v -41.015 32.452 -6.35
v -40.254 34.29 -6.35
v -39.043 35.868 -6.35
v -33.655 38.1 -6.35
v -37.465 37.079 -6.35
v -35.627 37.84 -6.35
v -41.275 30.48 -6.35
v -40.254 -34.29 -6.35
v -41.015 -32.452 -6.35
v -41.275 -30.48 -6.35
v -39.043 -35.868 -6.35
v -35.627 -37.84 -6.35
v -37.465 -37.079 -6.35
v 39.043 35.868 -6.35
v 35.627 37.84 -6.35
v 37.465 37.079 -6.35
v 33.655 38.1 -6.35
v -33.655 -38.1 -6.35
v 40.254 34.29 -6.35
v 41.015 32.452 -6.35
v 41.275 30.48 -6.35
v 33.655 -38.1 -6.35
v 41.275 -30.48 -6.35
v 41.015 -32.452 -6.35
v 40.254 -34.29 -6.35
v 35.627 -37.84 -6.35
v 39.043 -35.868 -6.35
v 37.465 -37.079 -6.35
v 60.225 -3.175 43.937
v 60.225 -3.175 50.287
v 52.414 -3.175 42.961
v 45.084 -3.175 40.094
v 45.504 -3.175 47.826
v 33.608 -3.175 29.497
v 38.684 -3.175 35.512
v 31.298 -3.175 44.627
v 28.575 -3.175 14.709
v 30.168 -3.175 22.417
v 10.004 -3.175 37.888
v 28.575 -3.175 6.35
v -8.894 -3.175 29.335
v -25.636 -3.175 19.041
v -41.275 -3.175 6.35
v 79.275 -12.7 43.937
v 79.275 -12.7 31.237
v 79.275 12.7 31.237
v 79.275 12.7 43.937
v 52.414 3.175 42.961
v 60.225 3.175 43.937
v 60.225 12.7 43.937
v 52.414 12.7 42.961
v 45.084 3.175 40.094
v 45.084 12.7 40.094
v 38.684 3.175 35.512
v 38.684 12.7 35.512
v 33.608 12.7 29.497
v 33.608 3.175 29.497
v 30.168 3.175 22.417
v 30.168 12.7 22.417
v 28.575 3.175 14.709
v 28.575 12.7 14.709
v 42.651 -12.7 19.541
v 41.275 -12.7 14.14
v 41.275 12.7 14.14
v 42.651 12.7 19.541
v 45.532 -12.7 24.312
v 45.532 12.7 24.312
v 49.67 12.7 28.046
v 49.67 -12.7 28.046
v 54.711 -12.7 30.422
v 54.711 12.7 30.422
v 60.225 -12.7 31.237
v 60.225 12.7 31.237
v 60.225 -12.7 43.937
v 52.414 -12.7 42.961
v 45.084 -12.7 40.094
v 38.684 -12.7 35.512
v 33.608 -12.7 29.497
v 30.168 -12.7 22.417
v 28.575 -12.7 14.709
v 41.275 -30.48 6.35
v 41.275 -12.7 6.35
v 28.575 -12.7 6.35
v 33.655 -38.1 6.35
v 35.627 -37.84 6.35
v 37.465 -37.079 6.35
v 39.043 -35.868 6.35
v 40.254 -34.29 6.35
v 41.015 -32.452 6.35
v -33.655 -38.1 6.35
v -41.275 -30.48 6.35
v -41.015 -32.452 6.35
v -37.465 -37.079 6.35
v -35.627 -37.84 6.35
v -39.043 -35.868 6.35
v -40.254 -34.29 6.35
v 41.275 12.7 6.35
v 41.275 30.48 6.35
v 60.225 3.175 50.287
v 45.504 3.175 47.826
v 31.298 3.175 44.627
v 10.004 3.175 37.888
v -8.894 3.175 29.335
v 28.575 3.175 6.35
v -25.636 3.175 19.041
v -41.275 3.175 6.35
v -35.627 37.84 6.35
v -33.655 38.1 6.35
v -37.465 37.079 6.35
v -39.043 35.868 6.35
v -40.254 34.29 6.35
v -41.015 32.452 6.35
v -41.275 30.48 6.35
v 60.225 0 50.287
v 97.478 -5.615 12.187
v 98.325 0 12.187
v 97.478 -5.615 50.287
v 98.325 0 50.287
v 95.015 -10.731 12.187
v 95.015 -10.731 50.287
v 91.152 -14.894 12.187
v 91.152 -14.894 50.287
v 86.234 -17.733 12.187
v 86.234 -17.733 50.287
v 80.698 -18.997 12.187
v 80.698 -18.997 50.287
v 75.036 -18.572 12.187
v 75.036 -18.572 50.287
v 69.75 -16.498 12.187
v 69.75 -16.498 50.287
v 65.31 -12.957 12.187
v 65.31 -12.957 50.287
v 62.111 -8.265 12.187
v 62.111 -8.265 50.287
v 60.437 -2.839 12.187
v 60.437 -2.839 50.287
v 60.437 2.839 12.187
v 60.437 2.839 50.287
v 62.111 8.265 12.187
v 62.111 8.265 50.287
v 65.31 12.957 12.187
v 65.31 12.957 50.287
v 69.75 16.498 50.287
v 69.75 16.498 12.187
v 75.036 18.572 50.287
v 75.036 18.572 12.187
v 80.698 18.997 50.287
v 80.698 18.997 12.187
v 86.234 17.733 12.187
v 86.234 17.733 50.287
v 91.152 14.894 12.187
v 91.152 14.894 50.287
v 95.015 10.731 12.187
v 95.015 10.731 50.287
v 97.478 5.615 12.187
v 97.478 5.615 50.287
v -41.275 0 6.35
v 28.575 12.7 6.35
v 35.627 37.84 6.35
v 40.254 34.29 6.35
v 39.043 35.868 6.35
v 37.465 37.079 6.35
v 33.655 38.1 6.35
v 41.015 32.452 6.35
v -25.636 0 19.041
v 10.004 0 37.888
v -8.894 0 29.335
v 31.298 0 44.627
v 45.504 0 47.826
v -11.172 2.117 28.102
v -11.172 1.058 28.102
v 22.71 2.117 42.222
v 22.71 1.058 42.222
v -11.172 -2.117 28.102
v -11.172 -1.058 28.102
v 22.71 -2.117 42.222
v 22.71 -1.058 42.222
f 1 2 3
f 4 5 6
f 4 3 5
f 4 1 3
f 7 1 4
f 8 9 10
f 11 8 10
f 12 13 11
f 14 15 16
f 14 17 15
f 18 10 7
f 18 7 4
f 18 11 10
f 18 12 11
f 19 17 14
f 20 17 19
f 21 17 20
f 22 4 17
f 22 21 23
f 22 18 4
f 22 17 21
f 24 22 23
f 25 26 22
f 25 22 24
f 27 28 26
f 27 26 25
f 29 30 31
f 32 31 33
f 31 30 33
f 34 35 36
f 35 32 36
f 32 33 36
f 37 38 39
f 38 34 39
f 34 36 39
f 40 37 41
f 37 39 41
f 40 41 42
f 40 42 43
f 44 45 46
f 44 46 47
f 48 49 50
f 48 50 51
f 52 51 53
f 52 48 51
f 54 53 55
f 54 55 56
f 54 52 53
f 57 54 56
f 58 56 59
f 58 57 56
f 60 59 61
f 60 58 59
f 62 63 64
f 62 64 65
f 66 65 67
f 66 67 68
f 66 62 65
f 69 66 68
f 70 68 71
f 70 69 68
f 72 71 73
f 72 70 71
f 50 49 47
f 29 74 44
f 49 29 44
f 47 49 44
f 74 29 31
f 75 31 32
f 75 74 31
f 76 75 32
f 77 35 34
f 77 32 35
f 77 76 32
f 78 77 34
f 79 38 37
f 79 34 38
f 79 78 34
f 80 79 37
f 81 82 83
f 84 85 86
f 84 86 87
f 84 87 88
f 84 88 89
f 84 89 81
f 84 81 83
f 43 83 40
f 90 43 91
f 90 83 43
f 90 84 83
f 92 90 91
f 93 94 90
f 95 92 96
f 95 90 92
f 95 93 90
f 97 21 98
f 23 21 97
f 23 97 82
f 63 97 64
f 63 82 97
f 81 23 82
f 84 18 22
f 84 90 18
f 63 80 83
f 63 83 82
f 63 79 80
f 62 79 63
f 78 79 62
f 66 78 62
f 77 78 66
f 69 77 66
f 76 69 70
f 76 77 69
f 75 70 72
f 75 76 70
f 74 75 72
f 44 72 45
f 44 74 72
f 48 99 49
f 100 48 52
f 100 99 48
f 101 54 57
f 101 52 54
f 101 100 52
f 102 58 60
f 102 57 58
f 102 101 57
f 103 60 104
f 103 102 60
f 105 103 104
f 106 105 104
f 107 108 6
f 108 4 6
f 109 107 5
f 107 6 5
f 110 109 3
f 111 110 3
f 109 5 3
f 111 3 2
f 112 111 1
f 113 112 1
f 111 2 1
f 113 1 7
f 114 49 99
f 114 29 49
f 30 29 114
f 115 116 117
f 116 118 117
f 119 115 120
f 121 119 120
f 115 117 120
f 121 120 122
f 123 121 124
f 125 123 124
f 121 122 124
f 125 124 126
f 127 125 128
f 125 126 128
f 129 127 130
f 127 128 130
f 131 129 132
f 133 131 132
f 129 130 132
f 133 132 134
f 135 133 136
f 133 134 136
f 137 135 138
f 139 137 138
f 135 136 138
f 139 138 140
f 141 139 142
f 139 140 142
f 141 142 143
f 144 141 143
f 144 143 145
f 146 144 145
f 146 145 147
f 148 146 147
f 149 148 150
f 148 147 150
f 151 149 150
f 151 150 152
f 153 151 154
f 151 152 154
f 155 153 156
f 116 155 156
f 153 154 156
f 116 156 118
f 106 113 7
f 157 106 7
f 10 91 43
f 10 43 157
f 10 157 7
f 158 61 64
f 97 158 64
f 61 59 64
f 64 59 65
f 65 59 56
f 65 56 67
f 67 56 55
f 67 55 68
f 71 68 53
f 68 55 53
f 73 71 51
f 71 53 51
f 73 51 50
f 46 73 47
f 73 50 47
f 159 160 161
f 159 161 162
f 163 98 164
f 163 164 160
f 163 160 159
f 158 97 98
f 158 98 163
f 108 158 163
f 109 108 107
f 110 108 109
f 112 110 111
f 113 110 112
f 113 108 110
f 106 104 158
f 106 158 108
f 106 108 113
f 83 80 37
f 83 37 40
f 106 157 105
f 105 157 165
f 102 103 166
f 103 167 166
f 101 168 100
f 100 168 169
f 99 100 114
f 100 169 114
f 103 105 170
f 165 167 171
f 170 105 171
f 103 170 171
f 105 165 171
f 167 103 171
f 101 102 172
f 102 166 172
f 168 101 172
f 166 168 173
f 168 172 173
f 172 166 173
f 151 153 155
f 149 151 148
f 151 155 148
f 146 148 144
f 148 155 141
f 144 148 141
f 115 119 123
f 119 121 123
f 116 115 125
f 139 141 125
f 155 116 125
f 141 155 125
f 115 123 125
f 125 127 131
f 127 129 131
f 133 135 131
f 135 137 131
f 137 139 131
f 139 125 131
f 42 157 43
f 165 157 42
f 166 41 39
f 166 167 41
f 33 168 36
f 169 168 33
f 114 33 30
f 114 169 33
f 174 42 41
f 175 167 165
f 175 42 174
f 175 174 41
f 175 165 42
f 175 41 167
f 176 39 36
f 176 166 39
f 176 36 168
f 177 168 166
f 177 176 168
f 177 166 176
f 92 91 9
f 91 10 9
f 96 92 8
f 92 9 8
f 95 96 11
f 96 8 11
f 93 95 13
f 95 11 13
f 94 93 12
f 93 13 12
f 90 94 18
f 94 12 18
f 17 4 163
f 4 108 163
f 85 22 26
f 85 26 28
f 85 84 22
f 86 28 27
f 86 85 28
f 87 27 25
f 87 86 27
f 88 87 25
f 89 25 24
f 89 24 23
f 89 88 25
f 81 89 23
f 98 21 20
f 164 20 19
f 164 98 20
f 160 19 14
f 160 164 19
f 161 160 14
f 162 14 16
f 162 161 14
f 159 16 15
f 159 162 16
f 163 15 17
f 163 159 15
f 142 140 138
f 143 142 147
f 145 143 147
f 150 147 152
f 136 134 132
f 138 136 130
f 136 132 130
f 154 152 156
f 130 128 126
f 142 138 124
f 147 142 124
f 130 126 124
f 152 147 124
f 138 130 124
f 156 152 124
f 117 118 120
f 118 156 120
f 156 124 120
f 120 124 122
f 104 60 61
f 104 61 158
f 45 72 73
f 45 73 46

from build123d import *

# Parameters (mm, degrees)
F1_DEPTH = 38.1
F0_W     = 19.05
F0_H     = 12.7
F2_DEPTH = 12.7
F3_DEPTH = 3.175
F5_R     = 7.62
F6_R     = 7.62
F7_R     = 7.62
F8_R     = 7.62


with BuildPart() as f1:
    # F0 (on Front) → F1 (new body, symmetric)
    with BuildSketch(Plane.XZ):
        Polygon((28.575, 6.35), (-41.275, 6.35), (-41.275, -6.35), (41.275, -6.35), (41.275, 6.35), align=None)
    extrude(amount=F1_DEPTH, both=True)

    # F0 (on Front) → F2 (join, symmetric)
    with BuildSketch(Plane.XZ):
        with BuildLine():
            Line((28.575, 14.709284), (28.575, 6.35))
            Line((28.575, 6.35), (41.275, 6.35))
            Line((41.275, 6.35), (41.275, 14.139723))
            ThreePointArc((41.275, 14.139723), (47.463322, 26.330939), (60.224654, 31.237004))
            Line((60.224654, 31.237004), (60.224654, 43.937004))
            ThreePointArc((60.224654, 43.937004), (38.684226, 35.512364), (28.575, 14.709284))
        make_face()
        with Locations((69.749654, 37.587004)):
            Rectangle(F0_W, F0_H)
    extrude(amount=F2_DEPTH, both=True)

    # F0 (on Front) → F3 (join, symmetric)
    with BuildSketch(Plane.XZ):
        with BuildLine():
            add(Edge.make_bspline(
                [(-41.275, 6.35), (-13.110146, 32.443307), (20.942546, 44.724606), (60.224654, 50.287004)],
                knots=[0, 0, 0, 0, 110.601266, 110.601266, 110.601266, 110.601266], degree=3))
            Line((-41.275, 6.35), (28.575, 6.35))
            Line((28.575, 6.35), (28.575, 14.709284))
            ThreePointArc((28.575, 14.709284), (38.684226, 35.512364), (60.224654, 43.937004))
            Line((60.224654, 43.937004), (60.224654, 50.287004))
        make_face()
    extrude(amount=F3_DEPTH, both=True)

    # F5
    f5_edges = [f1.edges().sort_by_distance(p)[0] for p in [
        (41.275, -38.1, 0),
    ]]
    fillet(f5_edges, radius=F5_R)

    # F6
    f6_edges = [f1.edges().sort_by_distance(p)[0] for p in [
        (41.275, 38.1, 0),
    ]]
    fillet(f6_edges, radius=F6_R)

    # F7
    f7_edges = [f1.edges().sort_by_distance(p)[0] for p in [
        (-41.275, 38.1, 0),
    ]]
    fillet(f7_edges, radius=F7_R)

    # F8
    f8_edges = [f1.edges().sort_by_distance(p)[0] for p in [
        (-41.275, -38.1, 0),
    ]]
    fillet(f8_edges, radius=F8_R)


with BuildPart() as f4:
    # F0 (on Front) → F4 (revolve)
    with BuildSketch(Plane.XZ):
        Polygon((98.324654, 50.287004), (79.274654, 50.287004), (79.274654, 43.937004), (79.274654, 31.237004), (79.274654, 12.187004), (98.324654, 12.187004), align=None)
    revolve(axis=Axis((79.274654, 0, 31.237004), (0, 0, -1)))


solid = Compound([f1.part, f4.part])
